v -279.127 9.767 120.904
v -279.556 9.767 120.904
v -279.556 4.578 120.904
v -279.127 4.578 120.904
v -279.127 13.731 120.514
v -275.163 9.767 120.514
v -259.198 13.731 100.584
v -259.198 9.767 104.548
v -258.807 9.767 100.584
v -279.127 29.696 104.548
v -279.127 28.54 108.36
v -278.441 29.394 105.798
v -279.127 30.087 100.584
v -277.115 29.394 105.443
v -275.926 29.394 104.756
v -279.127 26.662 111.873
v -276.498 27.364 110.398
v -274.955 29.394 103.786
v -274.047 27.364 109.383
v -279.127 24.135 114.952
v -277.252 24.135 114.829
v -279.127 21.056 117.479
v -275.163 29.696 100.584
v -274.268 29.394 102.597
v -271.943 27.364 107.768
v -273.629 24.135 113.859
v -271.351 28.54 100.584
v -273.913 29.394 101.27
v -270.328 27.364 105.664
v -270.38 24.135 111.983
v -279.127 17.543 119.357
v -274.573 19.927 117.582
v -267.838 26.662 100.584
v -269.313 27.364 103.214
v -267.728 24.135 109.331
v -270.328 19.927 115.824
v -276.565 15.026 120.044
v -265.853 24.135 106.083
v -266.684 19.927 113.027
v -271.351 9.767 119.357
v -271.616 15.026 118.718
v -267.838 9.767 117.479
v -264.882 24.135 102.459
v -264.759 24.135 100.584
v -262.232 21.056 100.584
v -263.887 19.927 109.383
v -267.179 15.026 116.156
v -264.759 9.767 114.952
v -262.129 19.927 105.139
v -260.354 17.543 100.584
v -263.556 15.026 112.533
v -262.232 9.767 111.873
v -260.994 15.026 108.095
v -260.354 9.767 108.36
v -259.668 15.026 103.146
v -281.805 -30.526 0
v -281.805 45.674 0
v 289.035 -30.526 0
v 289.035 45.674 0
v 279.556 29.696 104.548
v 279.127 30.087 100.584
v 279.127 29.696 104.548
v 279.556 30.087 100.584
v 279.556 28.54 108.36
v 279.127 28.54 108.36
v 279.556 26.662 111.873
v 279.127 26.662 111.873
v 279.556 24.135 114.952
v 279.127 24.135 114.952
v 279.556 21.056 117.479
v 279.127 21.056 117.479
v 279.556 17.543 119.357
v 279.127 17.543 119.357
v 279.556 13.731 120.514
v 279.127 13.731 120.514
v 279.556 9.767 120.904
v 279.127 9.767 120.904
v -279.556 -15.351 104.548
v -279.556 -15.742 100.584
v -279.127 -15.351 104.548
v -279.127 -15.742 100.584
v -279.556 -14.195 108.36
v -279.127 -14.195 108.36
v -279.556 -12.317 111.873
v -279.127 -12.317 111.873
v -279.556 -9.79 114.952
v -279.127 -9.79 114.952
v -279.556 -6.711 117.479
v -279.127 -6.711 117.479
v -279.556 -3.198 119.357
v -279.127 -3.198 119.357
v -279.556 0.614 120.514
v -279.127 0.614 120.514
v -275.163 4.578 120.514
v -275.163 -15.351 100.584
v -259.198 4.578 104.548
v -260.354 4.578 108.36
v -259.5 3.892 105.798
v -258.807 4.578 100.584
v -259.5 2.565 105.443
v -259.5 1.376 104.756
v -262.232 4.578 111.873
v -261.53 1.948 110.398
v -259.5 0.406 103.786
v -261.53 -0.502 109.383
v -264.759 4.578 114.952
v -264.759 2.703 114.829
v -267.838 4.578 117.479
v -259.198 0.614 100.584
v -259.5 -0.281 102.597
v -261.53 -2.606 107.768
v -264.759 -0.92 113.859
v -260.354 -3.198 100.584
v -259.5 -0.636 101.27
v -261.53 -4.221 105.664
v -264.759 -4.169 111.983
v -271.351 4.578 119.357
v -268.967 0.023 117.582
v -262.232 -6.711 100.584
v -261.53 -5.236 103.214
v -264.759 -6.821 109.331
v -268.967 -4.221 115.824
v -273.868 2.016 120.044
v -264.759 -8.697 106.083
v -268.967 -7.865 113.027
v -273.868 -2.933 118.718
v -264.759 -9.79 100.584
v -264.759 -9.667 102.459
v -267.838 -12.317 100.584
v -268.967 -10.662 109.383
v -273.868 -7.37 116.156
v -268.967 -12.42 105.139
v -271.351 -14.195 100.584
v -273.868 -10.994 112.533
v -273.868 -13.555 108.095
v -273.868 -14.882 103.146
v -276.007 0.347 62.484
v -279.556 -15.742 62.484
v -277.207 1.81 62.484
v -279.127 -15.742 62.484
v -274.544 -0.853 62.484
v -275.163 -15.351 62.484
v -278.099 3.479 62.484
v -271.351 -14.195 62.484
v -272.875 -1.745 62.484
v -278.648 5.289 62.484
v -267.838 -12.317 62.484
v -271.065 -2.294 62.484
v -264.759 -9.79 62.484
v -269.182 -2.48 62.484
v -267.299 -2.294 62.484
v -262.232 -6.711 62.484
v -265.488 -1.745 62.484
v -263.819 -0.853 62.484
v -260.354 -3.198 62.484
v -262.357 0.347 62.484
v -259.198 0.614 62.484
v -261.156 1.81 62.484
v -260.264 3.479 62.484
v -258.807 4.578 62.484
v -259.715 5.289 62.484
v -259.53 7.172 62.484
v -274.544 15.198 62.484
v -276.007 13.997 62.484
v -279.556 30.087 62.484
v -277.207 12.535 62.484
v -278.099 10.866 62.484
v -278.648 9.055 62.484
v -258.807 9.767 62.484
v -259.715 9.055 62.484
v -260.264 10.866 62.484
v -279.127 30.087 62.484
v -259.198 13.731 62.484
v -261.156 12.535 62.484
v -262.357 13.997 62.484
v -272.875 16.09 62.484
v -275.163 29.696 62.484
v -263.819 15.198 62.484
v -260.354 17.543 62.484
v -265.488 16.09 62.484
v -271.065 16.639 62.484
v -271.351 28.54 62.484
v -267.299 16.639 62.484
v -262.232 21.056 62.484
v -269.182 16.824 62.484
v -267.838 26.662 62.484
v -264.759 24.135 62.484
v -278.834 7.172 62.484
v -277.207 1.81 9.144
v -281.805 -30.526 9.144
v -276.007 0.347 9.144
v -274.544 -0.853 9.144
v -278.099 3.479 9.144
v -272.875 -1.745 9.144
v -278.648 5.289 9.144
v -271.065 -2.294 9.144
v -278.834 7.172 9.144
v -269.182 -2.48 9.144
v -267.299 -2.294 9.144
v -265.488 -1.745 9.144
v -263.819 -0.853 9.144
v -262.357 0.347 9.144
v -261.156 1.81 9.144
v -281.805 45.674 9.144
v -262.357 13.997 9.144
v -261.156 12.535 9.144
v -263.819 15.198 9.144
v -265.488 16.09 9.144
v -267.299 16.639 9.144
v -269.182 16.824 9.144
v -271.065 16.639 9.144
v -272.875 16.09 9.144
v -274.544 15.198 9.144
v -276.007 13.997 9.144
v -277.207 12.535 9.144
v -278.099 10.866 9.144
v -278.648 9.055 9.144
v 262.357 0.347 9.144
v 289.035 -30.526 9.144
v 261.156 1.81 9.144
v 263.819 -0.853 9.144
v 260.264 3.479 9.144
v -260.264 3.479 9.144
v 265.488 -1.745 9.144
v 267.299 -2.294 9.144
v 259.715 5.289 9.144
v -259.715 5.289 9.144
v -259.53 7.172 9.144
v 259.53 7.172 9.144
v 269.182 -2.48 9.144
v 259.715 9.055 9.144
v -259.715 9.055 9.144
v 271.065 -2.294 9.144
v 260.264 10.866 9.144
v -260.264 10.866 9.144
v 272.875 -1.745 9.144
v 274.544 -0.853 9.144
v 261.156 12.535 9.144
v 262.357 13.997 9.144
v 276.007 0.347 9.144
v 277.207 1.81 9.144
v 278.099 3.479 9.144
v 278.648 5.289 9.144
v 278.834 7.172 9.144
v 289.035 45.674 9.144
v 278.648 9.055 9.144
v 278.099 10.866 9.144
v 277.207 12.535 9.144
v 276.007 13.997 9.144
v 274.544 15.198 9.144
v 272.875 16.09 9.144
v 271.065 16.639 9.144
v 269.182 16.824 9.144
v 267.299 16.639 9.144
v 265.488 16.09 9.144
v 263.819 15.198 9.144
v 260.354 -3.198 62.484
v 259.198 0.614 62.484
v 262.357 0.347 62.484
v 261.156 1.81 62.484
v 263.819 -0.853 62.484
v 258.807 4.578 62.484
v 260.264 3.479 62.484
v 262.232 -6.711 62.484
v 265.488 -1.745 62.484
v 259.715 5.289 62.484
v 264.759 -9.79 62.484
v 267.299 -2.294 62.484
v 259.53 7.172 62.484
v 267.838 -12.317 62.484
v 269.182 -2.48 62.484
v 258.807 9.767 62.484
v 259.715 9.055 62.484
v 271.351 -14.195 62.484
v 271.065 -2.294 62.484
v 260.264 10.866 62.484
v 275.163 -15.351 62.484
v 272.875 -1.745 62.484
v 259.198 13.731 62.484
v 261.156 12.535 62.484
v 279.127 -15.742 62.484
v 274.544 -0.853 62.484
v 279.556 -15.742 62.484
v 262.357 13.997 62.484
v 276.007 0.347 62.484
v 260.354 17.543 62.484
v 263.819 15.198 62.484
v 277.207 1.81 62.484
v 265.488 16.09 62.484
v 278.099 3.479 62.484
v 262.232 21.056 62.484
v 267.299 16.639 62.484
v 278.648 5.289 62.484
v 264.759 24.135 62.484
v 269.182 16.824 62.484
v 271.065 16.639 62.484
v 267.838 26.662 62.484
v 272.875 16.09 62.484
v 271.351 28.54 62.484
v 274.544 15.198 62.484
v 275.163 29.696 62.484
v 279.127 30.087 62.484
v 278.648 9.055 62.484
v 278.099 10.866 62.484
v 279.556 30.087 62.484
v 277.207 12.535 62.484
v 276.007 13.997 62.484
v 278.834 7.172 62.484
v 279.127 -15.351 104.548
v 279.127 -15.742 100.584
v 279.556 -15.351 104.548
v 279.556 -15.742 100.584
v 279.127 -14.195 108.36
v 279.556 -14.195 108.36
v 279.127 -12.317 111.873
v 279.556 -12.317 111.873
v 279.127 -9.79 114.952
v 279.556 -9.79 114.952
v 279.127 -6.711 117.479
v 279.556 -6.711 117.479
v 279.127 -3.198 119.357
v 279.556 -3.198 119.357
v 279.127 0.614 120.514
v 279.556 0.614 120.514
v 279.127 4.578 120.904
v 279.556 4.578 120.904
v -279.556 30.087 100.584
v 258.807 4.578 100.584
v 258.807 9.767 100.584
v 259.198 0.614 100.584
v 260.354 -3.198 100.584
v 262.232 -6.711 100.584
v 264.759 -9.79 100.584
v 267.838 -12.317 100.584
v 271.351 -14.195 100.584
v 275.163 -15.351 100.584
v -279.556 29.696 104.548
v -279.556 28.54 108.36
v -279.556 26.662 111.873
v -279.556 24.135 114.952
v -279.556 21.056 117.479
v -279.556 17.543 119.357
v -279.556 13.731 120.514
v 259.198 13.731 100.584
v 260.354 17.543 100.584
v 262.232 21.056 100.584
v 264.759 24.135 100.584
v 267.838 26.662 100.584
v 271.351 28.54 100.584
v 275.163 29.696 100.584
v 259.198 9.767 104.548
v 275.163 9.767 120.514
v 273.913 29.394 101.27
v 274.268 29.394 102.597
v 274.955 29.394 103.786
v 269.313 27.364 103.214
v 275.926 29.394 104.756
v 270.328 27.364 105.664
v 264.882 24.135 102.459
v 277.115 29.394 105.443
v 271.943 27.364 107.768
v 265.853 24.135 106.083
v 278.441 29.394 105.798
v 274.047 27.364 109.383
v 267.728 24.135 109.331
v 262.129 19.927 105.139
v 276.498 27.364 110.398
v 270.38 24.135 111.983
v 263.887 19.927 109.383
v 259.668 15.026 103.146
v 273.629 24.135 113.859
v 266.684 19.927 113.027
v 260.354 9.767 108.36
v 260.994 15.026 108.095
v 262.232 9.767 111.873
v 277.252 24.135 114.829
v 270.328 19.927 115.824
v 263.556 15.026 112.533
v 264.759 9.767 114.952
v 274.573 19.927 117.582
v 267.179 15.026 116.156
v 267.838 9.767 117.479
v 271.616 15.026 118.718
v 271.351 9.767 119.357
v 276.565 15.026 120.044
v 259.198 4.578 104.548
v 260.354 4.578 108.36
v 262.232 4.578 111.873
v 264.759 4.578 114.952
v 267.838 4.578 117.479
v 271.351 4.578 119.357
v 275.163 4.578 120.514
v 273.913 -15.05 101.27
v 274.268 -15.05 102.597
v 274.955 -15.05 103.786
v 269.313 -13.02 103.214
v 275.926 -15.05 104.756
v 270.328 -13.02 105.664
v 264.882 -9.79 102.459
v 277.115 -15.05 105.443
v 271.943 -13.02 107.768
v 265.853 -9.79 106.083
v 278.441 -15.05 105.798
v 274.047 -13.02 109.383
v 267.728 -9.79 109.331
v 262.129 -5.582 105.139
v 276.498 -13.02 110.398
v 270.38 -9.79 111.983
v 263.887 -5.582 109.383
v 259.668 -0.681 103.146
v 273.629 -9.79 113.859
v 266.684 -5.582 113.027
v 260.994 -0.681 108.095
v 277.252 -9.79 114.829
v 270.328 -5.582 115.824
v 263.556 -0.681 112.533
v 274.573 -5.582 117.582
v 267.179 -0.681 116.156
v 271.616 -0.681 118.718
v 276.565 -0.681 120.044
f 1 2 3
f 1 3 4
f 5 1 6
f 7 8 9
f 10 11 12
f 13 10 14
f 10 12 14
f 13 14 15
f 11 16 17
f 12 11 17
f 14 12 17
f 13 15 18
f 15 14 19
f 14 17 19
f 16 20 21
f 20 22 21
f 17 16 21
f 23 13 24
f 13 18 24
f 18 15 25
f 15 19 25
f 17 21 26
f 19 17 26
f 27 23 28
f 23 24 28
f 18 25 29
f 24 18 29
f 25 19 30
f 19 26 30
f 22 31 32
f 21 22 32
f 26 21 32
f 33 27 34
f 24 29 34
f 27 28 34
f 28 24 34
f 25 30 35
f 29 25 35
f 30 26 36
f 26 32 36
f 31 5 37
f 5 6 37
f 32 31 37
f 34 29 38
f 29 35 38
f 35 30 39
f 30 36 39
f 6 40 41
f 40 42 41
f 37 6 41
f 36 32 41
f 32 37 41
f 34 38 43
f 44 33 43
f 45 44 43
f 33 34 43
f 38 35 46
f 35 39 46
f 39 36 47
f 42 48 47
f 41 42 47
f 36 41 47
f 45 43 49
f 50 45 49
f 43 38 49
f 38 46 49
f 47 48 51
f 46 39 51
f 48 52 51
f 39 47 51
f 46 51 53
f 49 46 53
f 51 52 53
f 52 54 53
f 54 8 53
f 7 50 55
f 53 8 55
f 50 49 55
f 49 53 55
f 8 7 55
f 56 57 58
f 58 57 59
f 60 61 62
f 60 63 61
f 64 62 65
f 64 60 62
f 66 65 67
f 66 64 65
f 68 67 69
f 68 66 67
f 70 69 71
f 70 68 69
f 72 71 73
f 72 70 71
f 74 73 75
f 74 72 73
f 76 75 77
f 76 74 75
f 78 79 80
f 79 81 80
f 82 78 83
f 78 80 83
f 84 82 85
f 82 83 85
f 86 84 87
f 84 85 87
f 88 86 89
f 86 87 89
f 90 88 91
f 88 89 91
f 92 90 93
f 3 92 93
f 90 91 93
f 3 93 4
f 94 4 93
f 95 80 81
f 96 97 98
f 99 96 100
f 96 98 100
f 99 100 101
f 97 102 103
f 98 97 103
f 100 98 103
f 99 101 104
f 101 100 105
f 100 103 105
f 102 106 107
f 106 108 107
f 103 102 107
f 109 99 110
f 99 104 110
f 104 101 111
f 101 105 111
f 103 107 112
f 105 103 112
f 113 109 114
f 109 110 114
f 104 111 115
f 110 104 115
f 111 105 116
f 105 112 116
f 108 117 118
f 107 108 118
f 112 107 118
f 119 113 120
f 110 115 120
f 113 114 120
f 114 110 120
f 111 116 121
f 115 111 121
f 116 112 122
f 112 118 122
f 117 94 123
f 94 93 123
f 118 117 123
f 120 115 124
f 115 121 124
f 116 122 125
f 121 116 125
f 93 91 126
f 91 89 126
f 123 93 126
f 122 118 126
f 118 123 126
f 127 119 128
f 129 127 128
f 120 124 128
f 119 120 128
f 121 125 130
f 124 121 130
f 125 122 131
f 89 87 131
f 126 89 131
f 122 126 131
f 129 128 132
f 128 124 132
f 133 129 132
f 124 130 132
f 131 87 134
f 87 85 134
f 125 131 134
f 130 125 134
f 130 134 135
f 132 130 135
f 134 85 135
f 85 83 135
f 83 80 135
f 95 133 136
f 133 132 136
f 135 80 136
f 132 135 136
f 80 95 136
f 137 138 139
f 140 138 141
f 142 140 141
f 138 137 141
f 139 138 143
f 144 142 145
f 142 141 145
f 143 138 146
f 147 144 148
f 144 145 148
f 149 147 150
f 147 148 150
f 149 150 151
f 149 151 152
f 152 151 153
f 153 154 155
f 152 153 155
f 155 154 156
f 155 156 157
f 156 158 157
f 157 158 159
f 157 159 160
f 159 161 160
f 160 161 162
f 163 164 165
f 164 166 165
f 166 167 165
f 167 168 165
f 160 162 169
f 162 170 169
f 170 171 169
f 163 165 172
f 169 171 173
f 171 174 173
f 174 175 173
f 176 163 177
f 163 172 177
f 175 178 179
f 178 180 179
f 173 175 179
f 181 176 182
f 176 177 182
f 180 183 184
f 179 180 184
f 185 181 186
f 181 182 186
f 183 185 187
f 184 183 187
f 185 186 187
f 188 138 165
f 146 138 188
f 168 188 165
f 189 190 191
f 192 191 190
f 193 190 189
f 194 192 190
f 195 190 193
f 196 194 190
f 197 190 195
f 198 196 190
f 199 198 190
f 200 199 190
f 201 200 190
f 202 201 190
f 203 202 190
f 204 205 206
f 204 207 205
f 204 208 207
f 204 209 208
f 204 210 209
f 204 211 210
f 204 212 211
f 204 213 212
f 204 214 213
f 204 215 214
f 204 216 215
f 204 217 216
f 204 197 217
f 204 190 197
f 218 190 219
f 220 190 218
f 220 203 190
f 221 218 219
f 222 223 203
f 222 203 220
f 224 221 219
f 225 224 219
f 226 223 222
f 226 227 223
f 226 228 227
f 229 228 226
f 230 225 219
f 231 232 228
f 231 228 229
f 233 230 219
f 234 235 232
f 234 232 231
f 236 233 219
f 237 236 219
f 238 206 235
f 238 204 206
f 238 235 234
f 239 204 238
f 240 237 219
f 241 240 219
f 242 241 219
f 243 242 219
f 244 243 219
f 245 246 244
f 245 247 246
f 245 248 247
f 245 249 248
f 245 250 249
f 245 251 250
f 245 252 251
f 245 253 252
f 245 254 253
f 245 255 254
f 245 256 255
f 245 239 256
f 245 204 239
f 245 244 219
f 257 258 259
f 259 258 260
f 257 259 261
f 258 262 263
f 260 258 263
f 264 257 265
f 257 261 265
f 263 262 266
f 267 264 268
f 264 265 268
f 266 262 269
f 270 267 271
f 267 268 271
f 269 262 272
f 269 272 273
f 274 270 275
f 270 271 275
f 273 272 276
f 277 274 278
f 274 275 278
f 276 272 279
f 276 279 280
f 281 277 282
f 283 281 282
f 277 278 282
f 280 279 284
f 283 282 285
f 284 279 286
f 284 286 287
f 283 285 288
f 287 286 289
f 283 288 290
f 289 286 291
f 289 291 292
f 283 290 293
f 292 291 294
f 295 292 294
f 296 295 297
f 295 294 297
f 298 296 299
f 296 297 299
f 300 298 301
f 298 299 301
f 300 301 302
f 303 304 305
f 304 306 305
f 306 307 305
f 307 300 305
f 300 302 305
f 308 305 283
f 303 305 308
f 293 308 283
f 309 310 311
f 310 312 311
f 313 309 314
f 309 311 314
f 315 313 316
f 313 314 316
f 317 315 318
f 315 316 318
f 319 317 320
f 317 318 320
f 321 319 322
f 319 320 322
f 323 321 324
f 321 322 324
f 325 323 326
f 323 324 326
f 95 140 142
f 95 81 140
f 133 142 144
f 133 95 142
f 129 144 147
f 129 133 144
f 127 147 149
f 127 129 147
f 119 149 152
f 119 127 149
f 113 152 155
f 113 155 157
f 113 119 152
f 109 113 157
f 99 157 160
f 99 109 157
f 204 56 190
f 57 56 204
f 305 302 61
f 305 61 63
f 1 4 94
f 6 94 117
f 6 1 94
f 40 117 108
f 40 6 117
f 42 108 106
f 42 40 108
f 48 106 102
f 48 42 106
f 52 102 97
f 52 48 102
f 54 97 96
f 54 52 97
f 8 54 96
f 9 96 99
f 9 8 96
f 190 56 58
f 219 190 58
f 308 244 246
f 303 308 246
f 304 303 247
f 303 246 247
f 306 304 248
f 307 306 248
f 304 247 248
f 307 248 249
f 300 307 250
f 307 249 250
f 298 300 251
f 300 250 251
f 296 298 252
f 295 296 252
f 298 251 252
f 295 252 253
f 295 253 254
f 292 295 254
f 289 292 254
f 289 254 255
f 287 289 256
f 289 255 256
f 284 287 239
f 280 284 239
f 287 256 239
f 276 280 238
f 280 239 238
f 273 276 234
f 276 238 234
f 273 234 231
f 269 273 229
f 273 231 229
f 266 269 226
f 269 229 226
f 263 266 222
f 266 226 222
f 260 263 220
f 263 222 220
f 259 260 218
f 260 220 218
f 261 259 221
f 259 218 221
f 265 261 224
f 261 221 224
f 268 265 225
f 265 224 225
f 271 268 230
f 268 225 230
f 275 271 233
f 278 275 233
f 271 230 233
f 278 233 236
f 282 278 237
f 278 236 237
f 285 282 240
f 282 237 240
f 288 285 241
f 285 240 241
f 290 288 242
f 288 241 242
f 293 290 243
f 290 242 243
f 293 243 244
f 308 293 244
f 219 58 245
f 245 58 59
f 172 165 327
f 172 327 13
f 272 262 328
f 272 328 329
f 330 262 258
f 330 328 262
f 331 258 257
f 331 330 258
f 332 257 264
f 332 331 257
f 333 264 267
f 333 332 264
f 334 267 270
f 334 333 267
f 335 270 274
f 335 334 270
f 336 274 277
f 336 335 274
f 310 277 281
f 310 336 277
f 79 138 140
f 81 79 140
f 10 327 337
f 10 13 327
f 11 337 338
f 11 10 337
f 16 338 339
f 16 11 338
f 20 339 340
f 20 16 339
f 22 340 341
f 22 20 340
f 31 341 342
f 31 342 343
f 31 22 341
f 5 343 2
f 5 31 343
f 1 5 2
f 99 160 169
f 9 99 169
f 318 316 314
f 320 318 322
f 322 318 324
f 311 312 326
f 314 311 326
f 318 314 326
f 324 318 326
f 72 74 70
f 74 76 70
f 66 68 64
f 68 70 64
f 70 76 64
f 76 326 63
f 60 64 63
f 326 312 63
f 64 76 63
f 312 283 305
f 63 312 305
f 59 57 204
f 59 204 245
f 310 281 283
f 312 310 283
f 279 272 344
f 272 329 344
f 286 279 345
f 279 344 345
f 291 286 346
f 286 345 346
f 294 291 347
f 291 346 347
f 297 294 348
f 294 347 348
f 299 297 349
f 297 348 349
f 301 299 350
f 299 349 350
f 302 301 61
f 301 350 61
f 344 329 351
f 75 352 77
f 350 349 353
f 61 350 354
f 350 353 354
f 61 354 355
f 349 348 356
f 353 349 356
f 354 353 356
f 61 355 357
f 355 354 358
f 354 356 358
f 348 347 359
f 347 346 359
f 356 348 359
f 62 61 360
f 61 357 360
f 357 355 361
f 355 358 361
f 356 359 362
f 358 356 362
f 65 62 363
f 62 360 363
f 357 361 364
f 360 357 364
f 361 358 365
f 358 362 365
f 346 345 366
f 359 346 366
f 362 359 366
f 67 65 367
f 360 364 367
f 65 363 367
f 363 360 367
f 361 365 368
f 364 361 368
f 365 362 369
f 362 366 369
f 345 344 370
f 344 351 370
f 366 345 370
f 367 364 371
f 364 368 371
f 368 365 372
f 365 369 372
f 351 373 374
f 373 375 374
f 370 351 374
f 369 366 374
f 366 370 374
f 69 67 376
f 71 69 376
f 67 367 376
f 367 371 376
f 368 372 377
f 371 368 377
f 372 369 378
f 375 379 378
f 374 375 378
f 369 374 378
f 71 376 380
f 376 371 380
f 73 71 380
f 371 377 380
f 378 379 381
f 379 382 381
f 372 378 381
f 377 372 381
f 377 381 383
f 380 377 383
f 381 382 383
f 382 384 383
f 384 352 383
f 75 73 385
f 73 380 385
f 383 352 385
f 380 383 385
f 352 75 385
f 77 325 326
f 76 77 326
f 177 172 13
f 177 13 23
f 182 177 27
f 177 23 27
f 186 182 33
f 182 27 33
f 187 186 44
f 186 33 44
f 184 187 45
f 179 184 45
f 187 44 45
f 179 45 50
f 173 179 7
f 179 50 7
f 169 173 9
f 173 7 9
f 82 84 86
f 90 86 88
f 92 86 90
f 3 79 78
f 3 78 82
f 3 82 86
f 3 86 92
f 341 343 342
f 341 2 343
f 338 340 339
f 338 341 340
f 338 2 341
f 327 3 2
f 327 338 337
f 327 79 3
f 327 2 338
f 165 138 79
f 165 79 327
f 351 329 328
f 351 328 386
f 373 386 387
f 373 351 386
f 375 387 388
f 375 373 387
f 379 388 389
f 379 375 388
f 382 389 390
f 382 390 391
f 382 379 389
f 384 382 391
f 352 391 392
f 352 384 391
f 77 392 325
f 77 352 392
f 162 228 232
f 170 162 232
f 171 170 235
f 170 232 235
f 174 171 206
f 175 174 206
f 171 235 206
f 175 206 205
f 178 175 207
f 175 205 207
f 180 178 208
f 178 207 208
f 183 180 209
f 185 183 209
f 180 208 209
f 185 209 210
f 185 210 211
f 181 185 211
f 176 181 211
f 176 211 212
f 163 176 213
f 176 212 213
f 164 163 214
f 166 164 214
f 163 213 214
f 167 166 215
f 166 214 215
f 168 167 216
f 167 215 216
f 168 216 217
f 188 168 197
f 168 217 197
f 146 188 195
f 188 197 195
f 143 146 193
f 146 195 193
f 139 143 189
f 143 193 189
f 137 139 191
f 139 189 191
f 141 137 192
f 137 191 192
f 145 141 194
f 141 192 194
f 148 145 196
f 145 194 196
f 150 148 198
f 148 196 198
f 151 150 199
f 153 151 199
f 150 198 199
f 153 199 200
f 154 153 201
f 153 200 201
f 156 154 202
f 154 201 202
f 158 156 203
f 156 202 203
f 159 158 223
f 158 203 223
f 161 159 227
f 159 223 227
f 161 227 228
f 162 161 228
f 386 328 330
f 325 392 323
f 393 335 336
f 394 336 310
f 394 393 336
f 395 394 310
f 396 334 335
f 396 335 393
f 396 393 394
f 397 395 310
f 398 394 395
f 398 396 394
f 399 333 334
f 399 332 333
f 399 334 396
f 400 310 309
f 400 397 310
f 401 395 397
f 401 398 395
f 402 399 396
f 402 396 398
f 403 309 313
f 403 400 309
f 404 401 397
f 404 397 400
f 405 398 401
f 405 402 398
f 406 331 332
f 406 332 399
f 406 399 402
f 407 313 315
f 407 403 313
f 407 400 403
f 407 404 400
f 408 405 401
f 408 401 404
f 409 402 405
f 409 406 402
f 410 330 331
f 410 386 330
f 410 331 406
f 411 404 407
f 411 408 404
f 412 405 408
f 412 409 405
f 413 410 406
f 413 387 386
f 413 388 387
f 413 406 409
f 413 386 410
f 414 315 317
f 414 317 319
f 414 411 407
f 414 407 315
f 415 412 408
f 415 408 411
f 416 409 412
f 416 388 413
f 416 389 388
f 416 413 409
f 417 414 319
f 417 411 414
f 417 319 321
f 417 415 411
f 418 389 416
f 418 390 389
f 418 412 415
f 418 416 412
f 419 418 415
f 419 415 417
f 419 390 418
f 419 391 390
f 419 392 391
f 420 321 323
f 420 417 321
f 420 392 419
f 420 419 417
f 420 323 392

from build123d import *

# Parameters (mm, degrees)
F0_W     = 570.8396
F0_H     = 76.2
F1_DEPTH = 9.144
F2_R     = 9.651965
F3_DEPTH = 53.34
F4_W     = 20.748643
F4_H     = 45.828542
F5_DEPTH = 58.42
F6_R     = 20.32
F7_R     = 20.32


with BuildPart() as f1:
    # F0 (on Top) → F1 (new body)
    with BuildSketch(Plane.XY):
        with Locations((3.614875, 7.573666)):
            Rectangle(F0_W, F0_H)
    extrude(amount=F1_DEPTH)

    # F2 (on face) → F3 (join)
    with BuildSketch(Plane.XY.offset(9.144)):
        with Locations((-269.181566, 7.172334)):
            Circle(F2_R)
        with Locations((269.181566, 7.172334)):
            Circle(F2_R)
    extrude(amount=F3_DEPTH)

    # F4 (on face) → F5 (join)
    with BuildSketch(Plane.XY.offset(62.484)):
        with Locations((-269.181565, 7.172334)):
            Rectangle(F4_W, F4_H)
        with Locations((269.181565, 7.172334)):
            Rectangle(F4_W, F4_H)
    extrude(amount=F5_DEPTH)

    # F6
    f6_edges = [f1.edges().sort_by_distance(p)[0] for p in [
        (-269.181566, -15.741937, 120.904),
        (-258.807244, 7.172334, 120.904),
        (-269.181566, 30.086605, 120.904),
        (-258.807244, -15.741937, 91.694),
        (-258.807244, 30.086605, 91.694),
    ]]
    fillet(f6_edges, radius=F6_R)

    # F7
    f7_edges = [f1.edges().sort_by_distance(p)[0] for p in [
        (258.807244, 7.172334, 120.904),
        (258.807244, 30.086605, 91.694),
        (258.807244, -15.741937, 91.694),
        (269.181566, -15.741937, 120.904),
        (269.181566, 30.086605, 120.904),
    ]]
    fillet(f7_edges, radius=F7_R)


solid = f1.part
